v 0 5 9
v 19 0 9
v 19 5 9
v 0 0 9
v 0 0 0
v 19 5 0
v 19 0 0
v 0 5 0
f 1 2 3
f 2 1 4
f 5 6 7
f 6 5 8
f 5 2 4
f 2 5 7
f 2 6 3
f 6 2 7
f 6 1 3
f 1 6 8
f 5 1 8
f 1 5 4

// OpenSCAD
// Generated by SolidPython 1.0.1 on 2020-07-29 00:46:56


cube(size = [19, 5, 9]);
/***********************************************
*********      SolidPython code:      **********
************************************************
 
# import packages: SolidPython
from solid import *
from solid.utils import *
from itertools import chain, combinations, permutations


class Resize:

    def __init__(self, scad_file):
        self.scad_file = scad_file
        #self.scad_file = import_scad(scad_file)
        # cone/cylinder param:
        self.r1 = 0
        self.r2 = 0
        self.h = 0
        # rectangular prism param:
        self.w = 0
        self.l = 0
        # ellipse param:
        self.r = 0

    # import OpenScad code (file name corresponds to shape)


    # classify shape + parameters
    def assign(self, param1, param2, param3):
        if self.scad_file == 'cone.scad':
            self.r1 = param1
            self.r2 = param2
            self.h = param3
        elif self.scad_file == 'cylinder.scad':
            self.r1 = param1
            self.r2 = param2
            self.h = param3
        elif self.scad_file == 'rectangularPrism.scad':
            self.h = param1
            self.l = param2
            self.w = param3
        else:
            self.r = param1
            self.h = param2

    # resize parameters
    def iterate(self):
        x = range(3, 20, 2)
        i = 1
        if self.scad_file == 'cone.scad':
            tempList = list(permutations(x, 2))
            for temp in tempList:
                param1 = temp[0]
                param2 = temp[1]
                filepath = 'produced_scad_files/' + 'cone' + str(param1) + '_' + str(param2) + '_' + '.scad'
                scad_render_to_file(cylinder(h=param1, r1=param2, r2=0), filepath)

        elif self.scad_file == 'cylinder.scad':
            tempList = list(permutations(x, 3))
            for temp in tempList:
                param1 = temp[0]
                param2 = temp[1]
                filepath = 'produced_scad_files/' + 'cylinder' + str(param1) + '_' + str(param2) + '_' + '.scad'
                scad_render_to_file(cylinder(h=param1, r1=param2, r2=param2), filepath)

        elif self.scad_file == 'rectangularPrism.scad':
            tempList = list(permutations(x, 3))
            for temp in tempList:
                param1 = temp[0]
                param2 = temp[1]
                param3 = temp[2]
                filepath = 'produced_scad_files/' + 'rectangularPrism' + str(param1) + '_' + str(param2) + '_' + str(
                    param3) + '.scad'
                scad_render_to_file(cube(size=(param1, param2, param3)), filepath)

        elif self.scad_file == 'ellipse.scad':
            tempList = list(permutations(x, 4))
            for temp in tempList:
                param1 = temp[0]
                param2 = temp[1]
                param3 = temp[2]
                param4 = temp[3]
                filepath = 'produced_scad_files/' + 'ellipse' + str(param1) + '_' + str(param2) + '_' + str(param3) + '_' + str(param4) + '.scad'
                scad_render_to_file(scale([param1, param2, param3])(sphere(r=param4)), filepath)

    def render_to_scadfile(self):
        scad_render_to_file(scad, 'example.scad') 
 
************************************************/
